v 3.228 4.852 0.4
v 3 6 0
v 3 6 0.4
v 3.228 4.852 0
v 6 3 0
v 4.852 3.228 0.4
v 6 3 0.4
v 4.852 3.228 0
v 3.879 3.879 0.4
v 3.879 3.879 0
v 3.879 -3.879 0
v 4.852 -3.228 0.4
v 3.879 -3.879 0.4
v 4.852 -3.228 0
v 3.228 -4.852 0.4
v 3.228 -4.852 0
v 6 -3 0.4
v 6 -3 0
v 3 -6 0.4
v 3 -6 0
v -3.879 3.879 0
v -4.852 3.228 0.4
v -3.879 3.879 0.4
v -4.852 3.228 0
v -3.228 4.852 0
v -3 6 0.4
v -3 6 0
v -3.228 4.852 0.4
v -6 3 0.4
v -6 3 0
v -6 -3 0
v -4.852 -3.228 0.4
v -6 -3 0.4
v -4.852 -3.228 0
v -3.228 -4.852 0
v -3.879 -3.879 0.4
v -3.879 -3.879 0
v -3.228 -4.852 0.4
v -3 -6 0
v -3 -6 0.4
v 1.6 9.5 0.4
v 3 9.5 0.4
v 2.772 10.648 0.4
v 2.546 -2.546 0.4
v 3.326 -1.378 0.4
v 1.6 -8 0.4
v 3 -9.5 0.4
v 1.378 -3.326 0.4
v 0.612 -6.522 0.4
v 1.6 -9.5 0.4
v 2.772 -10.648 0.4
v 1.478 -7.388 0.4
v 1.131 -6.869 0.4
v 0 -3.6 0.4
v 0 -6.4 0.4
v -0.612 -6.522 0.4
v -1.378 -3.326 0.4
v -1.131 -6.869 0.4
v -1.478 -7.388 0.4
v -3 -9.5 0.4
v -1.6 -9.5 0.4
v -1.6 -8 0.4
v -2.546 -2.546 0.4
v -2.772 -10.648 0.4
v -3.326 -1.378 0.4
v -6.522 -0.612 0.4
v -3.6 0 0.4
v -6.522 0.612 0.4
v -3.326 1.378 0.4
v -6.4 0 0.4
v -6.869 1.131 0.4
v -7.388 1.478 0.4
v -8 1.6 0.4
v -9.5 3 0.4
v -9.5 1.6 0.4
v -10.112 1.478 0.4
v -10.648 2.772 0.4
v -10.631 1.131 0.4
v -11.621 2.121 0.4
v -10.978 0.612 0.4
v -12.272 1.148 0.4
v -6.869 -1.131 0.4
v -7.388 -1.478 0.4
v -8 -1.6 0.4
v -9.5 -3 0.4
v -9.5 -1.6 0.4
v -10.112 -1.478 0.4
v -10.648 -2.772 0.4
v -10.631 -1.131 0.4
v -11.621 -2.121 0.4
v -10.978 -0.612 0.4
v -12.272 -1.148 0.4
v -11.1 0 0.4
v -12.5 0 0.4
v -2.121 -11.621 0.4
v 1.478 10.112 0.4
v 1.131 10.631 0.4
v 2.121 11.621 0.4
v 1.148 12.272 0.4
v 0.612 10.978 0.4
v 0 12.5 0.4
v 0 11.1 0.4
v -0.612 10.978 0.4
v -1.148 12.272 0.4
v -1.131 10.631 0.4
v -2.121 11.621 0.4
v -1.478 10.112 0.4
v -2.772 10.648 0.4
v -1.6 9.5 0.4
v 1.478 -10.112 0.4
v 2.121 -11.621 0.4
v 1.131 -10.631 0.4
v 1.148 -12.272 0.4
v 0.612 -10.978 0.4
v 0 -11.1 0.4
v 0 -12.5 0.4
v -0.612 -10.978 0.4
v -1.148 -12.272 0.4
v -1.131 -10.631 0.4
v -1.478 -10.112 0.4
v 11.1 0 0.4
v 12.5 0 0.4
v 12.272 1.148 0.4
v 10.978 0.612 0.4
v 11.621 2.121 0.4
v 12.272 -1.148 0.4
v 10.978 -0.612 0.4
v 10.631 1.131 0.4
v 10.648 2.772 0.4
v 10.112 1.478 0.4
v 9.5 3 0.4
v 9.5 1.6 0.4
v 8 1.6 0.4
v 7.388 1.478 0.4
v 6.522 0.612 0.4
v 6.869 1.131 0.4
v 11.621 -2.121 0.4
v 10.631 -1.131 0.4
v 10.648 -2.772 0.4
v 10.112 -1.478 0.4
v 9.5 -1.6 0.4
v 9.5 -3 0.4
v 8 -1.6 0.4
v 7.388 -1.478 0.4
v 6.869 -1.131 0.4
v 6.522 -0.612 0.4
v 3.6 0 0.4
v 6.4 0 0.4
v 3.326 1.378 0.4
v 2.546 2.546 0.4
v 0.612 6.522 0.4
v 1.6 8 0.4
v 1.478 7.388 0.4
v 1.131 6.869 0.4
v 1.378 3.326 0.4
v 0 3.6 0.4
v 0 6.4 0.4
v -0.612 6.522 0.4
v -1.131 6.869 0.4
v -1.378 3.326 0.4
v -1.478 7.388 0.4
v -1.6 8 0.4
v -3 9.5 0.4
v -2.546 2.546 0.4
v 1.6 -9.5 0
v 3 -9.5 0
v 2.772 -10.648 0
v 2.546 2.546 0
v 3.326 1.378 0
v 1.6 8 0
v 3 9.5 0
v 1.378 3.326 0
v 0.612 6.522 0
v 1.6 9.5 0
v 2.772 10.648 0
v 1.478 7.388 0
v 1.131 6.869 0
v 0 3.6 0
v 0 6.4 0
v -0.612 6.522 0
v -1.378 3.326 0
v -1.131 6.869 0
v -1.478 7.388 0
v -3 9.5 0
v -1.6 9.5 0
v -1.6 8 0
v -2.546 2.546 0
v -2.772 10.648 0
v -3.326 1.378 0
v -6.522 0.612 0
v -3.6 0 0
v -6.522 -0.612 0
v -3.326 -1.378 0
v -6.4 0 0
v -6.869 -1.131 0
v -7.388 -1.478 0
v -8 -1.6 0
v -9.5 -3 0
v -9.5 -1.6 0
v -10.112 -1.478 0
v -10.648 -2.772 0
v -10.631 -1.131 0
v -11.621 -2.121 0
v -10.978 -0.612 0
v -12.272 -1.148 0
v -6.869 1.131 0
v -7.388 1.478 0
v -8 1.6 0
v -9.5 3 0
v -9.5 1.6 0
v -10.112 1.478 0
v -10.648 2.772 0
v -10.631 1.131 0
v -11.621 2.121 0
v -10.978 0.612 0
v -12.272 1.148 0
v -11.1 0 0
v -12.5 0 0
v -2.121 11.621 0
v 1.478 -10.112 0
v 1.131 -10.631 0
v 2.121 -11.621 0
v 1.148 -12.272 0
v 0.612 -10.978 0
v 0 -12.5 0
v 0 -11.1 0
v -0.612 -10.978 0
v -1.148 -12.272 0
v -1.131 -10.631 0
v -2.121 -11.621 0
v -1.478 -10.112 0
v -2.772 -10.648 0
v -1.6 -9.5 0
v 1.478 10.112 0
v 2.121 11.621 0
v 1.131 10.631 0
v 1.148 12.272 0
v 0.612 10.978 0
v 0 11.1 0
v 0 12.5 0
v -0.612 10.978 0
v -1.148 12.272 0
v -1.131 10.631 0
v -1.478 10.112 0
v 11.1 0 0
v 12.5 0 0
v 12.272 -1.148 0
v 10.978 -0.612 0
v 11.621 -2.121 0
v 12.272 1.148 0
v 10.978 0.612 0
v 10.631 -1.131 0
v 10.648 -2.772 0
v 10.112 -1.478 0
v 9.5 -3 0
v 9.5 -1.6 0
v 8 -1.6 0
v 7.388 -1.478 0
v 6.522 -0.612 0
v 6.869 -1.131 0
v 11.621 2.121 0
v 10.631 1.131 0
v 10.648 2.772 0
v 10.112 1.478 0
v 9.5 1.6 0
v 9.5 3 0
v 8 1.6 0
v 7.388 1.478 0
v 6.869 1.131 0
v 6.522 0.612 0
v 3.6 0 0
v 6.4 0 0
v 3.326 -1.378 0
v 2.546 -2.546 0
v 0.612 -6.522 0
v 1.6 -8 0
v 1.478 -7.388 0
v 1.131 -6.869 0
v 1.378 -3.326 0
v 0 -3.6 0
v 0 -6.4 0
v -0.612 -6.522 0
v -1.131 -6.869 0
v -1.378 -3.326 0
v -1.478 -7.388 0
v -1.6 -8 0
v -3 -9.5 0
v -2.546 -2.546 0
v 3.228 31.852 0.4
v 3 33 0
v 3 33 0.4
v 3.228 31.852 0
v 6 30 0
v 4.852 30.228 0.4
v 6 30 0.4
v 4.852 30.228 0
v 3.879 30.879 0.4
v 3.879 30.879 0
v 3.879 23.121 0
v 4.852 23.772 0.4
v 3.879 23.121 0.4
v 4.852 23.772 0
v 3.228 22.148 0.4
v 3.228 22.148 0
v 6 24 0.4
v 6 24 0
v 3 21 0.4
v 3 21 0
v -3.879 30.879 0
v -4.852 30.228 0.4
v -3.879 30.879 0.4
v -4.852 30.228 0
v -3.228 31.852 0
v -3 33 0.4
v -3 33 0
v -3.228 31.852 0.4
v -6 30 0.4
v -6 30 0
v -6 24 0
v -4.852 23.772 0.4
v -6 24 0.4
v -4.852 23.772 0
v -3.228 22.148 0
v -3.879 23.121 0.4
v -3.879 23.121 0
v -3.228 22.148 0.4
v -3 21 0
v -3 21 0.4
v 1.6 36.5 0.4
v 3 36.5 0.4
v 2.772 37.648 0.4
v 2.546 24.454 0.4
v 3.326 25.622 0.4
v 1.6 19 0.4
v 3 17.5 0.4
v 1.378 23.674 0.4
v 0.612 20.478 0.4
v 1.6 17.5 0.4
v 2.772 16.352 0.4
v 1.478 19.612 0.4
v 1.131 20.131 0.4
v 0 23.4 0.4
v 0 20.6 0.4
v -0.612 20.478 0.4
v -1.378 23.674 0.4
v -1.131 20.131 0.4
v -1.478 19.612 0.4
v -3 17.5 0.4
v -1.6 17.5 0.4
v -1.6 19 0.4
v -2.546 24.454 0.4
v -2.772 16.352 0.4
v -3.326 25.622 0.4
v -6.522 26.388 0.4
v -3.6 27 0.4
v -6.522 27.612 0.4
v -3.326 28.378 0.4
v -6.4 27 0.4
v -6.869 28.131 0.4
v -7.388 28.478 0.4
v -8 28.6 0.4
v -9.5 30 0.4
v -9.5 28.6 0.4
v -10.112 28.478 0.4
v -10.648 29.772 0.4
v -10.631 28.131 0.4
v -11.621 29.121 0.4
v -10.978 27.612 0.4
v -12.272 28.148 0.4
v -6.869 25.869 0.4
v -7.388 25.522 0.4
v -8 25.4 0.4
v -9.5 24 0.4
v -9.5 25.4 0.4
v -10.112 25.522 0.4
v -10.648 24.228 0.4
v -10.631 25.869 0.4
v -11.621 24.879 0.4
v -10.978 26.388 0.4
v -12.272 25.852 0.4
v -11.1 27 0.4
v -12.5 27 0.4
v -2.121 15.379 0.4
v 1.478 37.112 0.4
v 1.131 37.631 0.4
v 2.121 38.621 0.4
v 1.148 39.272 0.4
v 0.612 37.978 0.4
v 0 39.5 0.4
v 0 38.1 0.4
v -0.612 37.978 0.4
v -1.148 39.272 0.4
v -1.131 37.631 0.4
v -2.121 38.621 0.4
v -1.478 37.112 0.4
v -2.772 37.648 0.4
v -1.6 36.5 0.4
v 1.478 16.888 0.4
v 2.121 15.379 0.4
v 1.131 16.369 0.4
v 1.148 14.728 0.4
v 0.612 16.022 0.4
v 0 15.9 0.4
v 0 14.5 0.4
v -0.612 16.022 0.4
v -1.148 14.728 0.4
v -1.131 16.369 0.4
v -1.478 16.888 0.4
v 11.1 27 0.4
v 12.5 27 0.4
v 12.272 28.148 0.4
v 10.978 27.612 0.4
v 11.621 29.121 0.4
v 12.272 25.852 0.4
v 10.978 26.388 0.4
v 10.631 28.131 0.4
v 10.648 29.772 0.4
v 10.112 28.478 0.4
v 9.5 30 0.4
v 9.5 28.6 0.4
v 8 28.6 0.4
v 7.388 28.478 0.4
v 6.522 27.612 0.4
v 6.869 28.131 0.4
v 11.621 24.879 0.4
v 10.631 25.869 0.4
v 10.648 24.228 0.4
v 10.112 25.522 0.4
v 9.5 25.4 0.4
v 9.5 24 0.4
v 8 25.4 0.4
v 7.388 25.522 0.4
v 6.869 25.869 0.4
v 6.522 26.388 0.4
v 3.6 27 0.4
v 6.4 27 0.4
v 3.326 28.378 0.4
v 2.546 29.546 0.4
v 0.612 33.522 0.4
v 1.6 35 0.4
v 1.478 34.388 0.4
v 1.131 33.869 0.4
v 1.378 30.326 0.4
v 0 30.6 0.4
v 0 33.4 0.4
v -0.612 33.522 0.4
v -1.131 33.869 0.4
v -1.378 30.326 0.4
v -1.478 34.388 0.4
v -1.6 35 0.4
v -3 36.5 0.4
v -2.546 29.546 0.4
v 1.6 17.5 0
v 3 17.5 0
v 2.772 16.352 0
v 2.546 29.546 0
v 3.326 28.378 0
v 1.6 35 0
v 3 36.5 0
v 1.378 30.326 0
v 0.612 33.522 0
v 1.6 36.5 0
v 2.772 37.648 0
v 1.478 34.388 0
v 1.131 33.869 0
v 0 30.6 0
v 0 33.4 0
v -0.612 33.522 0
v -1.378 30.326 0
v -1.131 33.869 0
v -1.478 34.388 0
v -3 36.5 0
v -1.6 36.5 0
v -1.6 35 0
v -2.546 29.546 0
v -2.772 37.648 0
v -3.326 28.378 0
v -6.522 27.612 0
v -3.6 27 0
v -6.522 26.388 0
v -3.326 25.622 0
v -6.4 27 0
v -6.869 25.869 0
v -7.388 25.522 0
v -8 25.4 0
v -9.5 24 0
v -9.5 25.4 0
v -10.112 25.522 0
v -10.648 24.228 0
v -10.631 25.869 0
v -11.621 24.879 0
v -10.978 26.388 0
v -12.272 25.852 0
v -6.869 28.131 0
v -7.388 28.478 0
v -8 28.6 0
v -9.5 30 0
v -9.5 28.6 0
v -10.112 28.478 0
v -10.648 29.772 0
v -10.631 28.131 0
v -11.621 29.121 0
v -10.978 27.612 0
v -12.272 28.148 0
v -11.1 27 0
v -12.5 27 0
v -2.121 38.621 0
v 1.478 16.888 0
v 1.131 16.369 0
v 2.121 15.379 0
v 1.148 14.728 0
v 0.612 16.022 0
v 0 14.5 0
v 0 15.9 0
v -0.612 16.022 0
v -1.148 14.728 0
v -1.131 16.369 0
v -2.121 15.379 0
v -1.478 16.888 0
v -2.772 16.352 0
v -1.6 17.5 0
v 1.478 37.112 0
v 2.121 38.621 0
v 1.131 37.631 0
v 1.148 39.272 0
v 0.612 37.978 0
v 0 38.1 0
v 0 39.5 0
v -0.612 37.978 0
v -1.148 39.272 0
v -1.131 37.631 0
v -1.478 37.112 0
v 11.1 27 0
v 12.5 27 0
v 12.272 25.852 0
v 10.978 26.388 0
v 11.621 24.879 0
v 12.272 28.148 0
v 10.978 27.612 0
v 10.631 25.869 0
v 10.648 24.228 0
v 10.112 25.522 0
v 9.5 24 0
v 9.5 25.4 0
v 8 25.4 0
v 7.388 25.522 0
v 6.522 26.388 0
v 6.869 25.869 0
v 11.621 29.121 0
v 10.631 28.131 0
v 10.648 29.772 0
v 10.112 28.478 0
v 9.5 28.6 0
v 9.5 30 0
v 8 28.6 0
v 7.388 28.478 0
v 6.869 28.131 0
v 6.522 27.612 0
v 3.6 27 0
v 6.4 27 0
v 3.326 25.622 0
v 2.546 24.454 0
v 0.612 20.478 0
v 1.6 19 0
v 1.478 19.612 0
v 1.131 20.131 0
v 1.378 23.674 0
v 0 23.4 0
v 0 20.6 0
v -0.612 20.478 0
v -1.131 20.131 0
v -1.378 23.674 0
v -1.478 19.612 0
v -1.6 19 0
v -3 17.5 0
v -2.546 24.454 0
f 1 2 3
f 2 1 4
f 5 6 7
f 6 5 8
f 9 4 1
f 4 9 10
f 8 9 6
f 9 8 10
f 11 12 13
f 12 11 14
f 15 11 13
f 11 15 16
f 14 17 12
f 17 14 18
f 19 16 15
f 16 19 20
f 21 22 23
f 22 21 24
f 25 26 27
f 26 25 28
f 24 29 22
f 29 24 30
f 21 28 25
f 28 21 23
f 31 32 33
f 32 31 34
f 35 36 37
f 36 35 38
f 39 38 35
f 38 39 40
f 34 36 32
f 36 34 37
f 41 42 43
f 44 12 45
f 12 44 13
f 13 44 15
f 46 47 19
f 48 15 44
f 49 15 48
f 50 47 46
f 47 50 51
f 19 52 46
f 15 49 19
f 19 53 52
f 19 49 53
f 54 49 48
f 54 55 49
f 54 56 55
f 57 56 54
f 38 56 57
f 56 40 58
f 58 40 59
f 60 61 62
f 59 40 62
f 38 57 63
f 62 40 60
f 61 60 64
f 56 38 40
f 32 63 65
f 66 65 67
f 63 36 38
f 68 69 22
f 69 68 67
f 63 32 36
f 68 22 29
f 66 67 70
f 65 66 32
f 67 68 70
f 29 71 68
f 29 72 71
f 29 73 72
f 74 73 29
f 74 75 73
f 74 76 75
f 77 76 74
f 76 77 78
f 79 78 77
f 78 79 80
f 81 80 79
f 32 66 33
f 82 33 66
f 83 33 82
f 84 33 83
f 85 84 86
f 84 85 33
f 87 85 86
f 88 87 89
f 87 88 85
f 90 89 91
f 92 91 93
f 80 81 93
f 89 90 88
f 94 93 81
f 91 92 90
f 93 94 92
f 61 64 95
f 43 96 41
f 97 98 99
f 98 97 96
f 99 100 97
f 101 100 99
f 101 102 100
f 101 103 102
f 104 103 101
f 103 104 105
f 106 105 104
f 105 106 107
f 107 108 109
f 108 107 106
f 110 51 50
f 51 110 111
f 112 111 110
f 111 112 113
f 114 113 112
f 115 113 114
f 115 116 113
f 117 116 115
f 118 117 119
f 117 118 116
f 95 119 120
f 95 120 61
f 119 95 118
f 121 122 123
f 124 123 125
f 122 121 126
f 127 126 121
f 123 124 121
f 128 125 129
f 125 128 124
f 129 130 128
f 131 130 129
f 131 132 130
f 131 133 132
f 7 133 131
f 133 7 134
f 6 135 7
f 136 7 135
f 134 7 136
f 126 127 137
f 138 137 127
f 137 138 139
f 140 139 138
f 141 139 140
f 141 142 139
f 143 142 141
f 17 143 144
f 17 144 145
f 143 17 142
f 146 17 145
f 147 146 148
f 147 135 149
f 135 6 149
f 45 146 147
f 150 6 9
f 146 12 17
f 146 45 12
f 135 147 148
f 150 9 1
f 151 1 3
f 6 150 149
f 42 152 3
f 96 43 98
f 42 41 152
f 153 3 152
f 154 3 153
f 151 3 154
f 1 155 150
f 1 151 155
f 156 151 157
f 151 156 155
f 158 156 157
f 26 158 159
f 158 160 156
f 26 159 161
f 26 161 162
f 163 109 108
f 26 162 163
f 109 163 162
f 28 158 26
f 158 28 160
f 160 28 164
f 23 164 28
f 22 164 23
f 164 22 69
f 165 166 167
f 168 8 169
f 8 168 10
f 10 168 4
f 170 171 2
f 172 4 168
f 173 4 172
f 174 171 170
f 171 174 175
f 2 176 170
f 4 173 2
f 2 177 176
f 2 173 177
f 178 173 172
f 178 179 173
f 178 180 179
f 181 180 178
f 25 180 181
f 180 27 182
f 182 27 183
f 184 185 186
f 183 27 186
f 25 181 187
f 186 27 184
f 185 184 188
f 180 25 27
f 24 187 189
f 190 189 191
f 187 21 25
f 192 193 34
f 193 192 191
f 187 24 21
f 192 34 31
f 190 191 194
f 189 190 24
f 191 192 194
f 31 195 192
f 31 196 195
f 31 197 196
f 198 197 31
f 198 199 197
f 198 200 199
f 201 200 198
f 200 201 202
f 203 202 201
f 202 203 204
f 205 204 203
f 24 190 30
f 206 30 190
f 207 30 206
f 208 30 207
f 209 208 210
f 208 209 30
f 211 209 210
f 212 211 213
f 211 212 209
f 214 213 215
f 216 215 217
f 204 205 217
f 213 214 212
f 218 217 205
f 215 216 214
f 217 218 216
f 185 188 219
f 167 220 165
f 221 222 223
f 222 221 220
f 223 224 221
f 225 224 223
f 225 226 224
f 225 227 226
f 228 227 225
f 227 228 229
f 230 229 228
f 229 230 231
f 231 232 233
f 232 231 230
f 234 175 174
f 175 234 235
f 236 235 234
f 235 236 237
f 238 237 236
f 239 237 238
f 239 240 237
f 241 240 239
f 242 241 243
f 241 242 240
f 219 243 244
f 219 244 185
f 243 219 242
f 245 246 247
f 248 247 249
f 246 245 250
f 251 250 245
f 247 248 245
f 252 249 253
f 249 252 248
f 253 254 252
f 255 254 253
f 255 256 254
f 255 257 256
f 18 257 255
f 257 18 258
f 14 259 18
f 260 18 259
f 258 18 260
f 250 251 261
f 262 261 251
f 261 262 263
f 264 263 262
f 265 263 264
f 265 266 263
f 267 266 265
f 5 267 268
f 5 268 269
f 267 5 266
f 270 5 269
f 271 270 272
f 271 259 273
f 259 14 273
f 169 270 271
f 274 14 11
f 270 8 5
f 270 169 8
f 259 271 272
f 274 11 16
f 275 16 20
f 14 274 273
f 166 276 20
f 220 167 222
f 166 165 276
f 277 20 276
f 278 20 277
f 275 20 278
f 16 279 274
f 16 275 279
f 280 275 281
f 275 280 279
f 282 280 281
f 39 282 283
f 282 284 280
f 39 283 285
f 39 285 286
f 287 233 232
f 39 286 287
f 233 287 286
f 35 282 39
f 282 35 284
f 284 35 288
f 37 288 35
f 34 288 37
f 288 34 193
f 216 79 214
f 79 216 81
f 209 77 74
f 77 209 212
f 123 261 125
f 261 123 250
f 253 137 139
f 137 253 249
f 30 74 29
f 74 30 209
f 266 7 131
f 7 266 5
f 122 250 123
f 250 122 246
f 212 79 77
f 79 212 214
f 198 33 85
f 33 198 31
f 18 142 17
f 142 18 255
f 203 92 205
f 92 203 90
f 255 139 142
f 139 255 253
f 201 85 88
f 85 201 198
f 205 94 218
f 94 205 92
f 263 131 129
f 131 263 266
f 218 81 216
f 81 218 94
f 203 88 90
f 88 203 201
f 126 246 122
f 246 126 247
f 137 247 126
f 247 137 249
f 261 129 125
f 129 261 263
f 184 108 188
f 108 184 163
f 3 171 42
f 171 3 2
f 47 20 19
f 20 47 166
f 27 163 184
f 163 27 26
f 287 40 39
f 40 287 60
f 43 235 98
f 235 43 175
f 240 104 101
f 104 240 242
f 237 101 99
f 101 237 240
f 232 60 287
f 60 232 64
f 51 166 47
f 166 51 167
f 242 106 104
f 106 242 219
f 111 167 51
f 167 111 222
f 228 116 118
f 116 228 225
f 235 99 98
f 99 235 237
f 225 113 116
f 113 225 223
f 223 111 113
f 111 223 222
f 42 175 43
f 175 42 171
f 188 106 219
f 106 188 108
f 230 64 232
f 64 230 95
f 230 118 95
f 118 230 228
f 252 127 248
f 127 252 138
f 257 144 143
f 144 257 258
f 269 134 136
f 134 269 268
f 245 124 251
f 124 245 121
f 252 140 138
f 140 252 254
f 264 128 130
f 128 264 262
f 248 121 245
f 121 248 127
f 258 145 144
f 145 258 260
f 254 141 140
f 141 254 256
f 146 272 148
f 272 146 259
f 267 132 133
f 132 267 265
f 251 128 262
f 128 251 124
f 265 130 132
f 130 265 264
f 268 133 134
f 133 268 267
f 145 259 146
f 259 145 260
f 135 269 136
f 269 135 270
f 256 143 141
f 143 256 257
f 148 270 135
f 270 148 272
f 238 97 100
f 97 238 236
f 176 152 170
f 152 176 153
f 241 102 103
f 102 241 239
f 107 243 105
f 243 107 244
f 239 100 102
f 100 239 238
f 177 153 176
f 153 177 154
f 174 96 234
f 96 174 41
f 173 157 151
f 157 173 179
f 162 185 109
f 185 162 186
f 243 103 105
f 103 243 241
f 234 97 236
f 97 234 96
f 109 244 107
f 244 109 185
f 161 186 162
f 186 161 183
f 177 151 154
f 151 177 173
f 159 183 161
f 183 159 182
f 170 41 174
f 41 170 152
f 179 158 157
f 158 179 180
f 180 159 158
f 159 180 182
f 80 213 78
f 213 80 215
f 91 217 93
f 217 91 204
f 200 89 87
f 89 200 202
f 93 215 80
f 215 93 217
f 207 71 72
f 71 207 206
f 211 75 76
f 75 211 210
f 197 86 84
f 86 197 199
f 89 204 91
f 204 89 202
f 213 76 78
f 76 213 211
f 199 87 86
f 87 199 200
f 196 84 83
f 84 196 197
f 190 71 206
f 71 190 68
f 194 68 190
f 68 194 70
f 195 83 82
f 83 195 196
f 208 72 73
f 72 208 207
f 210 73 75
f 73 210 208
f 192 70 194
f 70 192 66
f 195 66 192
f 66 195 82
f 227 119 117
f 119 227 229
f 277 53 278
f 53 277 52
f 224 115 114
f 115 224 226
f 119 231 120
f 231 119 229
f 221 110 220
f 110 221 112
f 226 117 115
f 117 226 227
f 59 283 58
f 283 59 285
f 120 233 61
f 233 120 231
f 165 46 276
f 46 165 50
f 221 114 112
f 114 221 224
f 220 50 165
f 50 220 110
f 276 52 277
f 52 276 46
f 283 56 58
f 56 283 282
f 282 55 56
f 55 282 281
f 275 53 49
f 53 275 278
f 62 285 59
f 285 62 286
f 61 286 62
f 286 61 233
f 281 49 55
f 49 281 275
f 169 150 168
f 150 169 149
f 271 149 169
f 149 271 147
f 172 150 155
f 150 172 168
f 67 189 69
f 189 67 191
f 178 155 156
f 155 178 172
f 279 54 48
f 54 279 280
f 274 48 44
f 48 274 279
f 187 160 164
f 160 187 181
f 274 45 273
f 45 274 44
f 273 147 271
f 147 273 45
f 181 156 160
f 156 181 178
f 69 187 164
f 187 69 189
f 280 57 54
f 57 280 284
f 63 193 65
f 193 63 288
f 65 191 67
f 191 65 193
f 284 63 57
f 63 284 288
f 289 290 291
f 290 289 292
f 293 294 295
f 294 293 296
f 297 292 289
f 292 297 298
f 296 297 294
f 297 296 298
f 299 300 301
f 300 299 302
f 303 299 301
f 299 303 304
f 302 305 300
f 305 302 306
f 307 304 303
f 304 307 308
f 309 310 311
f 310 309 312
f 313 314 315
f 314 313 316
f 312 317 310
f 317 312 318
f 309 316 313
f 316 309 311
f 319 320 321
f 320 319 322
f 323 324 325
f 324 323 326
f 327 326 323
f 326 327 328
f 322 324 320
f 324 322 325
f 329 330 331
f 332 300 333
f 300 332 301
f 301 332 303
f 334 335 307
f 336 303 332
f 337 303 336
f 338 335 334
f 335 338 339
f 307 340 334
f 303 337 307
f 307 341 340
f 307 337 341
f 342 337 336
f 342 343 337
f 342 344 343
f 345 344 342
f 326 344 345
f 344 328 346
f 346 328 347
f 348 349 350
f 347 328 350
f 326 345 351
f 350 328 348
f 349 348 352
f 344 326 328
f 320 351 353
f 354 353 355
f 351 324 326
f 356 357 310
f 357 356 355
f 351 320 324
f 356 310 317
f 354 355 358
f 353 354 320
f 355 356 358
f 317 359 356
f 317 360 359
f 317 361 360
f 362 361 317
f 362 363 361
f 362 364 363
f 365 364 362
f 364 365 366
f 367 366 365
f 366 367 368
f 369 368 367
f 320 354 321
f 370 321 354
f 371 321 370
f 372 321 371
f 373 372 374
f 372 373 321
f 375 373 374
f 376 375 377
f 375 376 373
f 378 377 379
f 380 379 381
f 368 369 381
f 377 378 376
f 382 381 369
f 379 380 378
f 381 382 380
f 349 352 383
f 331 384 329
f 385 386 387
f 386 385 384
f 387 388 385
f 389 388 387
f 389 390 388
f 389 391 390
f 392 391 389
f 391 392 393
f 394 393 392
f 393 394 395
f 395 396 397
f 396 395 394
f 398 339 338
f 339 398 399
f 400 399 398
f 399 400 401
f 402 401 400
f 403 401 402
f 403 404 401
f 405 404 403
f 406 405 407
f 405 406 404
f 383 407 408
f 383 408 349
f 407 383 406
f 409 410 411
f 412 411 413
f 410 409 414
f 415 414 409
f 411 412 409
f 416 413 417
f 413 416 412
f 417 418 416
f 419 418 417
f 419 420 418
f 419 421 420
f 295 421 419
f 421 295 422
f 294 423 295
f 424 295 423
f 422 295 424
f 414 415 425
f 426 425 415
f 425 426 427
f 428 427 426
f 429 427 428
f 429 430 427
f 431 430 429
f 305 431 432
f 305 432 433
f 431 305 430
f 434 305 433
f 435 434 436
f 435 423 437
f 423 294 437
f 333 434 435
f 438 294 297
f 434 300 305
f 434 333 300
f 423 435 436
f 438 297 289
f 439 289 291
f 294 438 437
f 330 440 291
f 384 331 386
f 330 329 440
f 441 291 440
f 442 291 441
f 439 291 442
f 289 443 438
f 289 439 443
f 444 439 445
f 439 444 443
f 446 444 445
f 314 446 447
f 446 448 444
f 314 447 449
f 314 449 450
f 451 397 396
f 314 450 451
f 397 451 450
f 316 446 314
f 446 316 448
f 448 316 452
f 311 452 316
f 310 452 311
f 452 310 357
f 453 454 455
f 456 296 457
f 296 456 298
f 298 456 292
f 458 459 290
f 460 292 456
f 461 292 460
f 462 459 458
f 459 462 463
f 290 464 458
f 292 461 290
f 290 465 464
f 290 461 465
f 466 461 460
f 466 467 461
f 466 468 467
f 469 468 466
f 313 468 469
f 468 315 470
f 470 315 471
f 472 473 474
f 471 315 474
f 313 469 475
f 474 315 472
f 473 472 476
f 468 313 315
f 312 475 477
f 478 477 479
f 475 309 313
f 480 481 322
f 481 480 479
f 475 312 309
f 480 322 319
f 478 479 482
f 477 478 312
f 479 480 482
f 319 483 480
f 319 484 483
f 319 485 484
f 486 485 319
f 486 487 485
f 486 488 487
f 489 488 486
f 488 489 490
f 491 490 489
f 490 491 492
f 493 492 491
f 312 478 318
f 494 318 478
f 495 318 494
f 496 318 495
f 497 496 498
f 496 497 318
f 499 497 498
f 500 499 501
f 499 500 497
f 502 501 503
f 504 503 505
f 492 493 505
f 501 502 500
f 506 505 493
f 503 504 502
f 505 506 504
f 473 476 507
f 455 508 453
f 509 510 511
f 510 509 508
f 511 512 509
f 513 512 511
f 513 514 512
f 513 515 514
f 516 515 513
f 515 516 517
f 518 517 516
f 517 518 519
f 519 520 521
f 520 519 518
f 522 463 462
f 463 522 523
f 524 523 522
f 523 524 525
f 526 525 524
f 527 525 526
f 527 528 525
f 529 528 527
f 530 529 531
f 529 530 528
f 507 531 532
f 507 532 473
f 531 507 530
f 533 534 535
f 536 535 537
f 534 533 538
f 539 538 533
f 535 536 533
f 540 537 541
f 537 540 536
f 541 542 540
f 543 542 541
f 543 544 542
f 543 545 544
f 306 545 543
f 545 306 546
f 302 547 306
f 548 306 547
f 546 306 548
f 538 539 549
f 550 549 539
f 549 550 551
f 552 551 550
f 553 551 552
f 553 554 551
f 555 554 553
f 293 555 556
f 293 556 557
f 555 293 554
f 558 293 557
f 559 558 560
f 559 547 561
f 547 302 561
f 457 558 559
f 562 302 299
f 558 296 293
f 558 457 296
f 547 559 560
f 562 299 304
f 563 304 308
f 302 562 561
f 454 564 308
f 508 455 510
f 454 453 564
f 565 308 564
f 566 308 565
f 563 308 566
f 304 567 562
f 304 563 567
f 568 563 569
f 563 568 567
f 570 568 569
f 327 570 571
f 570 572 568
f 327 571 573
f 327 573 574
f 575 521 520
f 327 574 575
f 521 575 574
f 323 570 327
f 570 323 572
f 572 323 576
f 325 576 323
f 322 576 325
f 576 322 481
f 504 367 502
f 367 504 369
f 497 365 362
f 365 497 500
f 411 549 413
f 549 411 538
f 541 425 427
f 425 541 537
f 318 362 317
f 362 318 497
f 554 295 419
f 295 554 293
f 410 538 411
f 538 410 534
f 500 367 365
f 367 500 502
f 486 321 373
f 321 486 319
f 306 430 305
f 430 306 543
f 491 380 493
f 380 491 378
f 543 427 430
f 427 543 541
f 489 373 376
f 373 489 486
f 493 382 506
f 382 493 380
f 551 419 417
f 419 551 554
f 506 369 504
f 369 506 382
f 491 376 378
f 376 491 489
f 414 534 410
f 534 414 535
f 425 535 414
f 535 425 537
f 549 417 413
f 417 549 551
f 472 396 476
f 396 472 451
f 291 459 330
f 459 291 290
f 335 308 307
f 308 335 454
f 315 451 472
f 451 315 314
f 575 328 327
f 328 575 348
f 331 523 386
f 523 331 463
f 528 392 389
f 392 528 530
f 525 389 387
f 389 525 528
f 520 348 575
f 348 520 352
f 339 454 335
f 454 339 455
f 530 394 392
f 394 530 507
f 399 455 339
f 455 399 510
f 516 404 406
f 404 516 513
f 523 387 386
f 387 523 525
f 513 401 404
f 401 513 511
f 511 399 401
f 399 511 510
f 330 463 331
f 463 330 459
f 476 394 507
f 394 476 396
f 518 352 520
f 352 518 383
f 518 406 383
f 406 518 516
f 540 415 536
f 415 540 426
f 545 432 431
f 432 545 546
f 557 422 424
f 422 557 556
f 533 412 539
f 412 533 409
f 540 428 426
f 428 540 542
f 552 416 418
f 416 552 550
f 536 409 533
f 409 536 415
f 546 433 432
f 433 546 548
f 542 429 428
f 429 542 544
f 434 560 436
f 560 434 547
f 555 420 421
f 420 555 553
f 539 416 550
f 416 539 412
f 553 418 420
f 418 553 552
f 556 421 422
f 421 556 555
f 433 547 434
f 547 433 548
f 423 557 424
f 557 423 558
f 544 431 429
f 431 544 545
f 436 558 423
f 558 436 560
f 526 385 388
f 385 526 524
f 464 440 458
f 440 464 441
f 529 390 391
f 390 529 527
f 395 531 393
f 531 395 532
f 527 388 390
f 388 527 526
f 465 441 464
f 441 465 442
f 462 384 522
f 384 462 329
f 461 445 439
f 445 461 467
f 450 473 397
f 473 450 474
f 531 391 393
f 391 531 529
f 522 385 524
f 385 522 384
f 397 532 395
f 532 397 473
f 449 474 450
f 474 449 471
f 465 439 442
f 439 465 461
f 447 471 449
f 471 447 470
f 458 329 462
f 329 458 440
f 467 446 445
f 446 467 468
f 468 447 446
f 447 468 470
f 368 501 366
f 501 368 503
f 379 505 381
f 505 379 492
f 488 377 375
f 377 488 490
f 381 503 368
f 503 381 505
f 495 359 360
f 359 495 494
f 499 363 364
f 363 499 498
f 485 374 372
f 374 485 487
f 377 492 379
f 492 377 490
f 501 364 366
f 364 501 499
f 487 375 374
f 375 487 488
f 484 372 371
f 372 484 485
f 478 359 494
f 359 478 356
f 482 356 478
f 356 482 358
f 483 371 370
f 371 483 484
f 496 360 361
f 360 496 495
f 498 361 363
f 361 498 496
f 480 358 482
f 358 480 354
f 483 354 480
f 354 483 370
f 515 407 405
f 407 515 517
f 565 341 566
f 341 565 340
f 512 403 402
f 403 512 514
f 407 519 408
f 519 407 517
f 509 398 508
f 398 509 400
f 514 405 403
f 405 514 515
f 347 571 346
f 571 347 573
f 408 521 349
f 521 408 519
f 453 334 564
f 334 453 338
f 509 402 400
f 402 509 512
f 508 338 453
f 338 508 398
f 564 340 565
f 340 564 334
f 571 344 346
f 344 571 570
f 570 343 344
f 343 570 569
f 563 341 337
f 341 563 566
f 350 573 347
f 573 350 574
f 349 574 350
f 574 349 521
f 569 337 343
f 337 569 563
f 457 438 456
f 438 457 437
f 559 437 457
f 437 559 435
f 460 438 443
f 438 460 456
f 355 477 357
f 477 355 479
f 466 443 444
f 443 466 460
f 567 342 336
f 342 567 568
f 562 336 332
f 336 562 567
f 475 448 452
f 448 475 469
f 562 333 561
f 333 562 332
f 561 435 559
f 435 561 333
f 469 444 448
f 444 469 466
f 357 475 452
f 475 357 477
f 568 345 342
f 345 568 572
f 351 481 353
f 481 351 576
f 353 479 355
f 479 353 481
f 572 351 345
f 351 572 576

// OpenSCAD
/* [General] */

// Two per motor (one on each side of the frame) is recommended.
count = 2; // [1:16]

/* [Slicer Setup] */

// Try to match your printer's nozzle
nozzle_diameter = 0.4;

// Set to the layer thickness you will use in your slicer.
layer_thickness = 0.2;

// Recommended: 2 or 3 depending on layer thickness
layer_count = 2;

/* [Motor Setup] */

/* A few useful presets:
 *   11xx motors:
 *     - center_hole_diameter = 4;
 *     - screw_hole_diameter = 2.25;
 *     - mounting_pattern_diameter_1 = 9.0;
 *     - mounting_pattern_diameter_2 = 9.0;
 *     - screw_head_diameter = 4.25;
 *
 *   2204-2206 motors:
 *     - center_hole_diameter = 7;
 *     - screw_hole_diameter = 3.15;
 *     - mounting_pattern_diameter_1 = 16.0;
 *     - mounting_pattern_diameter_2 = 19.0;
 *     - screw_head_diameter = 5.75;
 */

// Make sure it is big enough to not bind the motor c-clip.
center_hole_diameter = 7;

// Recommend adding 0.15-0.25 depending on your printer.
screw_hole_diameter = 3.15;

// This is center-to-center distance of two opposing screws
mounting_pattern_diameter_1 = 19.0;

// This is center-to-center distance of the other pair of screws
mounting_pattern_diameter_2 = 16.0;

// Recommend adding 0.25 or more if using washers
screw_head_diameter = 5.75;

/* [Advanced] */

// Resolution of circles (lower renders faster)
resolution = 16; // [16:Low, 32:Med, 64:High]

// Multiplier that effects the radius of the inner corner. 1.0 makes it the same as screw_head_diameter.
inner_corner_multiplier = 1.0;

/* [Hidden] */

$fn = resolution;

// Calculated

height = layer_thickness * layer_count;
motor_mount_max_r = max(mounting_pattern_diameter_1,mounting_pattern_diameter_2)/2;
motor_mount_min_r = min(mounting_pattern_diameter_1,mounting_pattern_diameter_2)/2;

// Round up to ensure no partial lines (based on nozzle_diameter)

function round_up_to_nearest_multiple(val, num) = num * ceil(val/num);
screw_hole_diameter_rounded = round_up_to_nearest_multiple(screw_hole_diameter, nozzle_diameter);
screw_head_diameter_rounded = round_up_to_nearest_multiple(screw_head_diameter, nozzle_diameter);
center_hole_diameter_rounded = round_up_to_nearest_multiple(center_hole_diameter, nozzle_diameter);

inner_corner_d = round_up_to_nearest_multiple((screw_head_diameter * inner_corner_multiplier), nozzle_diameter);
corner_offset = (screw_head_diameter_rounded + inner_corner_d) / 2;

module primary_form() {
  difference() {
    translate([0,0,height/2]) cube([corner_offset*2, corner_offset*2, height], center=true);

    for(v=[[corner_offset,corner_offset,-0.1],
            [corner_offset,-corner_offset,-0.1],
            [-corner_offset,corner_offset,-0.1],
            [-corner_offset,-corner_offset,-0.1]])
      translate(v) cylinder(d=inner_corner_d, h=height+0.2);
  }

  hull() {
    translate([motor_mount_max_r,0,0]) cylinder(d=screw_head_diameter_rounded, h=height);
    translate([-motor_mount_max_r,0,0]) cylinder(d=screw_head_diameter_rounded, h=height);
  }

  hull() {
    translate([0,motor_mount_max_r,0]) cylinder(d=screw_head_diameter_rounded, h=height);
    translate([0,-motor_mount_max_r,0]) cylinder(d=screw_head_diameter_rounded, h=height);
  }
}

module center_cutout() {
  cylinder(d=center_hole_diameter_rounded, h=height*2+0.1, center=true);
}

module screws_cutout() {
  for(i=[0:3]) {
    rotate([0,0,i*90]) {
      hull() {
        translate([motor_mount_max_r,0,0]) cylinder(d=screw_hole_diameter_rounded, h=height*2+0.1, center=true);
        translate([motor_mount_min_r,0,0]) cylinder(d=screw_hole_diameter_rounded, h=height*2+0.1, center=true);
      }
    }
  }
}

module soft_mount() {
  difference() {
    primary_form();
    center_cutout();
    screws_cutout();
  }
}

rows = ceil(sqrt(count));
cols = ceil(sqrt(count));
outside_d = motor_mount_max_r*2 + screw_head_diameter_rounded + 1;
for(i=[0:count-1]) {
  x_offset = floor(i/rows)*(outside_d+1);
  y_offset = floor(i % cols)*(outside_d+1);

  translate([x_offset, y_offset, 0]) soft_mount();
}
